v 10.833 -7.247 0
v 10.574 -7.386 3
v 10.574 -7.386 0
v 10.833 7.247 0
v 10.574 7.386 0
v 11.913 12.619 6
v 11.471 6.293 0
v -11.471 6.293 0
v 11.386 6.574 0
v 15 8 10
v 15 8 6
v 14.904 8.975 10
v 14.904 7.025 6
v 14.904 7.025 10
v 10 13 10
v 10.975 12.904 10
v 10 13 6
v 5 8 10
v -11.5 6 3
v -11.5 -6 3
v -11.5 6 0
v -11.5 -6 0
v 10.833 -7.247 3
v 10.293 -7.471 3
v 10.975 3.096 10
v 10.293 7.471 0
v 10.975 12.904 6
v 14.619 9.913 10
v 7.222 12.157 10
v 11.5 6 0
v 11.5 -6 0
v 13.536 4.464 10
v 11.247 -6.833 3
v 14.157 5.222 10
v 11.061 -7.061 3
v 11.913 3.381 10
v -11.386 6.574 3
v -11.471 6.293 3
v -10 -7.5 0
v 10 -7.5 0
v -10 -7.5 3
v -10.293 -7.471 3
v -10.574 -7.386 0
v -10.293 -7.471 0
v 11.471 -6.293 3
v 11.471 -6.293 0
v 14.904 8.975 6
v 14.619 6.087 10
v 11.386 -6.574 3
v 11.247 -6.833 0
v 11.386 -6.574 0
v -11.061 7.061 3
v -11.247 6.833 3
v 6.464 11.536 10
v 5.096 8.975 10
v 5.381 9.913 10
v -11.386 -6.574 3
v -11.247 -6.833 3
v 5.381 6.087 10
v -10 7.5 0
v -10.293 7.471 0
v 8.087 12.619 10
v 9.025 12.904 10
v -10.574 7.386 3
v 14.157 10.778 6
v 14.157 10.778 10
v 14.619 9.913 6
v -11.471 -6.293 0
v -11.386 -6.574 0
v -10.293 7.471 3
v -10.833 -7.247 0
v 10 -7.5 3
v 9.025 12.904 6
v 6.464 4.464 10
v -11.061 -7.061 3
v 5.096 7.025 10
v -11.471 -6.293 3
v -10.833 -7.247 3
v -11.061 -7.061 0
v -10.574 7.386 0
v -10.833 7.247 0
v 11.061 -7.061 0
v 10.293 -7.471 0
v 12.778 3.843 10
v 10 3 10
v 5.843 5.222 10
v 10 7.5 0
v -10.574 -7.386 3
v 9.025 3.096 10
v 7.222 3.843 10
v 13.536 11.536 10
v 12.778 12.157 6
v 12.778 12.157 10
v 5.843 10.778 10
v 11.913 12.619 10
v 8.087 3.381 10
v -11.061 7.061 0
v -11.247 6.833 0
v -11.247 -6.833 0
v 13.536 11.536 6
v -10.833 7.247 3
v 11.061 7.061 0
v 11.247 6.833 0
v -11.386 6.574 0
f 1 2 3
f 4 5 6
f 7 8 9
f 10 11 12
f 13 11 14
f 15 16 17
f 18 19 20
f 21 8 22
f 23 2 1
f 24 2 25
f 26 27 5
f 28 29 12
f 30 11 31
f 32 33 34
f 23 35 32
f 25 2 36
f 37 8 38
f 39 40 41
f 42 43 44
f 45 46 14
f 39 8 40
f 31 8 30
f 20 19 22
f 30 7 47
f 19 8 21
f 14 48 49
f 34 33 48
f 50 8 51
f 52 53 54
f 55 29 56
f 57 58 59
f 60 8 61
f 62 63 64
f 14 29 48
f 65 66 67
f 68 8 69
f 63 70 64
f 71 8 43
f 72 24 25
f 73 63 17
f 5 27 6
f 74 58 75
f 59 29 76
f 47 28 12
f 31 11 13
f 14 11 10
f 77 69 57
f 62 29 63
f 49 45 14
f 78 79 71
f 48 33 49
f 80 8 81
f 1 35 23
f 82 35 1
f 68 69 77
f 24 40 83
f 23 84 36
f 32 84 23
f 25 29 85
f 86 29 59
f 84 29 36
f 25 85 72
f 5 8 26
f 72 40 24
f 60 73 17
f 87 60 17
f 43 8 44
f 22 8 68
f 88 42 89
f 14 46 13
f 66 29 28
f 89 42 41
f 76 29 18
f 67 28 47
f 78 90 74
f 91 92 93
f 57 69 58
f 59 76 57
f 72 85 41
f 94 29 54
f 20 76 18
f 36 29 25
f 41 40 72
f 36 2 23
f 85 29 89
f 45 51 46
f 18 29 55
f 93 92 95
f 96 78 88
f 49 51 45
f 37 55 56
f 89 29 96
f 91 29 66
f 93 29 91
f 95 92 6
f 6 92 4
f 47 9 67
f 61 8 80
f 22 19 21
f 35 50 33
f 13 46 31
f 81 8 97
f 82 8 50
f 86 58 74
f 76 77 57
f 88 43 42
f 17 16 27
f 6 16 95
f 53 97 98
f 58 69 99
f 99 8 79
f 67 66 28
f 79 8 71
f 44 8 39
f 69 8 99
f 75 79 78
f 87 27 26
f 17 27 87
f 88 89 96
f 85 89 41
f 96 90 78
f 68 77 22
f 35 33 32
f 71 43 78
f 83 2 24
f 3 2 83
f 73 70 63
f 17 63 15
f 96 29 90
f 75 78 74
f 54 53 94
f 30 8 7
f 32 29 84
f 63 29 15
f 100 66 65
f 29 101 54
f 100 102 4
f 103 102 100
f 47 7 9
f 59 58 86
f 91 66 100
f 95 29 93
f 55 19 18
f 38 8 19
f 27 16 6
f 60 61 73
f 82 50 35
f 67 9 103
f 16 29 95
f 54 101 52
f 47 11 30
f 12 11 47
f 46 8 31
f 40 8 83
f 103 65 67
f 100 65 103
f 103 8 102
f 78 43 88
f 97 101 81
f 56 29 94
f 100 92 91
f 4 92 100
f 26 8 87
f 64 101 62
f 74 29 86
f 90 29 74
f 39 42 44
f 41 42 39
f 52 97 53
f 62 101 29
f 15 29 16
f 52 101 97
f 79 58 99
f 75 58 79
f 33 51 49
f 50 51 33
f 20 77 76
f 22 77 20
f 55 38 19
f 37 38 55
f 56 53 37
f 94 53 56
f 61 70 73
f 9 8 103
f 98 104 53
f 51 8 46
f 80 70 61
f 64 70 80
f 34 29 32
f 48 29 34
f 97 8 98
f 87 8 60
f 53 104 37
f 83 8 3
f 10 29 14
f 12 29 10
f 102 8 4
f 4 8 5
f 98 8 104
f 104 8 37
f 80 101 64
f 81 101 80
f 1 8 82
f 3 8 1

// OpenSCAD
// =============================================================================
// test_hull_linear_extrude.scad
//
// Hull between a 2D linear_extrude and a 3D primitive.
// Pattern from: gears.scad (large gear to small gear flange)
// Expected: convex hull bridging an extruded 2D shape and a cylinder.
// =============================================================================

$fn = 32;

hull() {
    // A rounded rectangular plate (extruded 2D shape)
    linear_extrude(height = 3) {
        offset(1.5) {
            square([20, 12], center = true);
        }
    }

    // A cylinder offset above
    translate([10, 8, 6]) {
        cylinder(r = 5, h = 4);
    }
}
